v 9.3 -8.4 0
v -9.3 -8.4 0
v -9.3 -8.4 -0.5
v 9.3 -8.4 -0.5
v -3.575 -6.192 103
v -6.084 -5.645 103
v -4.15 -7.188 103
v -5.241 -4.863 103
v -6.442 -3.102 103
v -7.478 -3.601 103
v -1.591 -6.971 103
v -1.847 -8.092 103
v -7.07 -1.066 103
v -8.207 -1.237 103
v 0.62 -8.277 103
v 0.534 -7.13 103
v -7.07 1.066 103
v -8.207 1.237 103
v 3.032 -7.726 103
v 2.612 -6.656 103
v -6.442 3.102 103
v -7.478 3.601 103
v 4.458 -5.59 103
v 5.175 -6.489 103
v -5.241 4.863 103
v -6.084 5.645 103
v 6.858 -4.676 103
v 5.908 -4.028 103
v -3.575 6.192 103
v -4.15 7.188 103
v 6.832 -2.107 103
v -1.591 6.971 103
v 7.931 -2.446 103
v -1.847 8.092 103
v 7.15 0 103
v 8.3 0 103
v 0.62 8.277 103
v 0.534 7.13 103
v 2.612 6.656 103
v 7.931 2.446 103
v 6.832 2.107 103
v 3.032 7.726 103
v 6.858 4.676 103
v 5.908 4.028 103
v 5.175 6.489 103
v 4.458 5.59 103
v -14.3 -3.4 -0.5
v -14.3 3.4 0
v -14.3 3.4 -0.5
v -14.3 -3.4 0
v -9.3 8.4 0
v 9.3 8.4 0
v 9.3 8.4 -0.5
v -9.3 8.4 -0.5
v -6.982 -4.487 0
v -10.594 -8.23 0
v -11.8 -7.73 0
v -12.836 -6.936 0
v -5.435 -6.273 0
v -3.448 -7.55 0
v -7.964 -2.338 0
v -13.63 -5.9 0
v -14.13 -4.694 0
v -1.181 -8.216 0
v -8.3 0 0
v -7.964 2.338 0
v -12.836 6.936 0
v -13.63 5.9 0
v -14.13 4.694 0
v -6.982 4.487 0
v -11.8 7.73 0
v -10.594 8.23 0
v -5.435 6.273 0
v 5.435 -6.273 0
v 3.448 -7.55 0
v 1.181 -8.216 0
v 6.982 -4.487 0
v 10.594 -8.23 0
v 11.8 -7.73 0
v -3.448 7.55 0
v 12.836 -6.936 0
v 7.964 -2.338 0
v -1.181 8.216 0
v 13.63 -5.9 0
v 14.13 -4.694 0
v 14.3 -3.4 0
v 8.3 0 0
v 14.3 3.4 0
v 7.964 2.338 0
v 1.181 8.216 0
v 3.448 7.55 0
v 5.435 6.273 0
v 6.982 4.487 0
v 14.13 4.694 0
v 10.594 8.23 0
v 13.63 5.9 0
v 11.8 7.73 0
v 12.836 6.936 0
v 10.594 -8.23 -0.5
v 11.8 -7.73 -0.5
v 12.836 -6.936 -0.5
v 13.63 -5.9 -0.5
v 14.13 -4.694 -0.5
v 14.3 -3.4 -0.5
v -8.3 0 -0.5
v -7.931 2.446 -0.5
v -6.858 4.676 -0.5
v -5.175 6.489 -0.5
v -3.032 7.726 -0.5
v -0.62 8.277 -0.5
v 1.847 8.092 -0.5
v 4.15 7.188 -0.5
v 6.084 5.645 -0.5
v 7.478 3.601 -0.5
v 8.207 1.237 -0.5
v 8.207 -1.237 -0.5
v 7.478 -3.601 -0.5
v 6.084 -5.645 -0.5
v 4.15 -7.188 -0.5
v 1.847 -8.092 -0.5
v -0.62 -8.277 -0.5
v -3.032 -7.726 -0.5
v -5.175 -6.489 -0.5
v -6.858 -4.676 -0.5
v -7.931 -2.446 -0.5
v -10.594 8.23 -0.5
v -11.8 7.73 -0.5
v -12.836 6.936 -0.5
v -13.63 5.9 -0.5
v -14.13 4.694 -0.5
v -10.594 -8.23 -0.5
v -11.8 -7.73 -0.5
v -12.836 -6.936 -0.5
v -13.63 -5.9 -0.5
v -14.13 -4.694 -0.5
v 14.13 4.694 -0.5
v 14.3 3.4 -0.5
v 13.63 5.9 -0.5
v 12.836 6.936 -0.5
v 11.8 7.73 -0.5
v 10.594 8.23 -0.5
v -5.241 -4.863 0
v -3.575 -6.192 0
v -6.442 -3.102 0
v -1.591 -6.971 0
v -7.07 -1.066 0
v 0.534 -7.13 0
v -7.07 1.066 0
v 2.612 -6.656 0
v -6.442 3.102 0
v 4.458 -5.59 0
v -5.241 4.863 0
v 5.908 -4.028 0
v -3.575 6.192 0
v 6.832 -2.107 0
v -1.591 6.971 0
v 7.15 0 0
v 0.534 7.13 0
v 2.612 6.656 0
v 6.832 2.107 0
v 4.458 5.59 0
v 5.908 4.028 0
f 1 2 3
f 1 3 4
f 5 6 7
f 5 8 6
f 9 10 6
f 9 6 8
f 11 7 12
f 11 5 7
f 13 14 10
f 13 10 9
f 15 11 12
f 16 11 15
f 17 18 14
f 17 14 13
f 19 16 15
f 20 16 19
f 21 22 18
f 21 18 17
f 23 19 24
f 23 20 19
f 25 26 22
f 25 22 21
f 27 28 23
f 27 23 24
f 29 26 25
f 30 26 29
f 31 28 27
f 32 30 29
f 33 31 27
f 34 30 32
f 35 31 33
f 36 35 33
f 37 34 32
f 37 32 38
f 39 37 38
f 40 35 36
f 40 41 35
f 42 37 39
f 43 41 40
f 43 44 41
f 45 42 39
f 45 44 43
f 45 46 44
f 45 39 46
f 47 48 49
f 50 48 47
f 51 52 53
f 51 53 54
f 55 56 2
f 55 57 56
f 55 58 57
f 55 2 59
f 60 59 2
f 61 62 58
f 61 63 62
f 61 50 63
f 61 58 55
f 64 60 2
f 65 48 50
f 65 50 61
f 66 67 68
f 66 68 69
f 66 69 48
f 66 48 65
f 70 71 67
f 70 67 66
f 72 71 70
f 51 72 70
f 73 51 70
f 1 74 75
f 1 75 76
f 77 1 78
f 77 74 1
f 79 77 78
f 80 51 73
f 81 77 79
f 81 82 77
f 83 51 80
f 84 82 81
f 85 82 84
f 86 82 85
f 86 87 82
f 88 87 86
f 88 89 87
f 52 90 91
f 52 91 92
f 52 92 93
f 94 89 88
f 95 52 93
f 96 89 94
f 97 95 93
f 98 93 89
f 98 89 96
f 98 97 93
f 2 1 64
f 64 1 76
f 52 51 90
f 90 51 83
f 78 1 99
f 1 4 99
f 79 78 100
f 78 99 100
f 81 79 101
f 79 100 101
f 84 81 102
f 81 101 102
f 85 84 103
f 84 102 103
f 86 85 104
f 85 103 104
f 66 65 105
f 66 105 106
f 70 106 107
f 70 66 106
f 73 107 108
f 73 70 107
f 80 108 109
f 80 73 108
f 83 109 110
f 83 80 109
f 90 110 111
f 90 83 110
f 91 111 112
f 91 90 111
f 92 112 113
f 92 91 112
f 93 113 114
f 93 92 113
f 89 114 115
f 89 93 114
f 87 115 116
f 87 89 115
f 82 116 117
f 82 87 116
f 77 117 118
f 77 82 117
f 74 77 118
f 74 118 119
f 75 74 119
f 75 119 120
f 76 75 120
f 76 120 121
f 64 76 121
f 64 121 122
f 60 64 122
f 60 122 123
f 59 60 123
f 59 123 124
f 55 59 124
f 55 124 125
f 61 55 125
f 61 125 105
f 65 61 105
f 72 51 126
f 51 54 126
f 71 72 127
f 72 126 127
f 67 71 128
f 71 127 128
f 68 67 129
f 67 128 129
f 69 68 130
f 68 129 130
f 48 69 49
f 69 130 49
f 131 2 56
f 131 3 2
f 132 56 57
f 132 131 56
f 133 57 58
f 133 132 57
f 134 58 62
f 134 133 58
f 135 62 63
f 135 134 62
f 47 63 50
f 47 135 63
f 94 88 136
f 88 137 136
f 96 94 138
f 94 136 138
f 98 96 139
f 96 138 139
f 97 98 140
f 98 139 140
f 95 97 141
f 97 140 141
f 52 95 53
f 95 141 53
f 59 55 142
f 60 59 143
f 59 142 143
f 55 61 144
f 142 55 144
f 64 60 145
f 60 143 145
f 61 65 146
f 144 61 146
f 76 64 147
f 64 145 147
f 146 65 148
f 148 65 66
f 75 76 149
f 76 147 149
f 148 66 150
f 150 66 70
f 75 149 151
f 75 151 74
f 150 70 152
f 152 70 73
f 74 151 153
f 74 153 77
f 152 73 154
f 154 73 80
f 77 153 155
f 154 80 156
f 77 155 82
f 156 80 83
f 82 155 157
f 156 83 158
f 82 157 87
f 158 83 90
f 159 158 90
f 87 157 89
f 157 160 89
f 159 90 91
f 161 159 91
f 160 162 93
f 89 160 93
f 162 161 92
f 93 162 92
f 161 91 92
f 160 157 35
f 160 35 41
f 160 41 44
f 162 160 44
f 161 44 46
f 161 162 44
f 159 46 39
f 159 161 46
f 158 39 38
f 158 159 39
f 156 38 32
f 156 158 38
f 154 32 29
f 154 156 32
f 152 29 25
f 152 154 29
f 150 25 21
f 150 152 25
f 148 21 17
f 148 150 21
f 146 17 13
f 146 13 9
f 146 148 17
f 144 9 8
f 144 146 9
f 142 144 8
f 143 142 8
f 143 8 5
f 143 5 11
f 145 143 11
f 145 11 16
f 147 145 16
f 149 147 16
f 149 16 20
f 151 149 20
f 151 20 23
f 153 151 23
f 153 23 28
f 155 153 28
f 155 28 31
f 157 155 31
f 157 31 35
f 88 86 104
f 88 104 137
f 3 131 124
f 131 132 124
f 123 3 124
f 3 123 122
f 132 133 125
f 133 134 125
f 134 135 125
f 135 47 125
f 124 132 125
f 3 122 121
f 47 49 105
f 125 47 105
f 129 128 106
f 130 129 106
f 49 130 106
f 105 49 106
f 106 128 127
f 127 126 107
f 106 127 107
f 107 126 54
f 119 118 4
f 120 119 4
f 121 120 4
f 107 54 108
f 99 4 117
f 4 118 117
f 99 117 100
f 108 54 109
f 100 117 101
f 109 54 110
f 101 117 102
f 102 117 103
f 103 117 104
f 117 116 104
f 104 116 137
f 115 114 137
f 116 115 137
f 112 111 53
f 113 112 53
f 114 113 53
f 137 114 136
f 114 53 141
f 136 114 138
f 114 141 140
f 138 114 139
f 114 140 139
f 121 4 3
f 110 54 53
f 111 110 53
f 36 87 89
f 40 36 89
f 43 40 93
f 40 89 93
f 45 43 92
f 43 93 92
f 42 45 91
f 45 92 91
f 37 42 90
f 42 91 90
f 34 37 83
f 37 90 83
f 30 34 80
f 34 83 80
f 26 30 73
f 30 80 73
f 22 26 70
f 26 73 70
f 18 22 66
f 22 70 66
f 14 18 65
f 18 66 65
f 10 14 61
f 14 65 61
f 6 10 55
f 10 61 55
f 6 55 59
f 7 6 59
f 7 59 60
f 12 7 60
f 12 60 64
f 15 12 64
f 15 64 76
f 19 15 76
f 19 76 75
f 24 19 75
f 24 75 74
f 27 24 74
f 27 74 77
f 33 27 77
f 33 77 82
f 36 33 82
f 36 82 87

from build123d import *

# Parameters (mm, degrees)
F1_DEPTH = 0.5
F0_R     = 7.15
F2_DEPTH = 100
F3_R     = 5
F4_DEPTH = 103


with BuildPart() as f1:
    # F0 (on Top) → F1 (new body)
    with BuildSketch(Plane.XY):
        with BuildLine():
            Line((14.3, 0), (8.3, 0))
            ThreePointArc((8.3, 0), (0, -8.3), (-8.3, 0))
            Line((-8.3, 0), (-14.3, 0))
            Line((-14.3, 0), (-14.3, -8.4))
            Line((-14.3, -8.4), (14.3, -8.4))
            Line((14.3, -8.4), (14.3, 0))
        make_face()
        with BuildLine():
            ThreePointArc((-8.3, 0), (0, 8.3), (8.3, 0))
            Line((8.3, 0), (14.3, 0))
            Line((14.3, 0), (14.3, 8.4))
            Line((14.3, 8.4), (-14.3, 8.4))
            Line((-14.3, 8.4), (-14.3, 0))
            Line((-14.3, 0), (-8.3, 0))
        make_face()
    extrude(amount=-F1_DEPTH)

    # F3
    f3_edges = [f1.edges().sort_by_distance(p)[0] for p in [
        (14.3, -8.4, -0.25),
        (14.3, 8.4, -0.25),
        (-14.3, 8.4, -0.25),
        (-14.3, -8.4, -0.25),
    ]]
    fillet(f3_edges, radius=F3_R)



with BuildPart() as f2:
    # F0 (on Top) → F2 (new body)
    with BuildSketch(Plane.XY):
        with BuildLine():
            ThreePointArc((-8.3, 0), (0, -8.3), (8.3, 0))
            ThreePointArc((8.3, 0), (0, 8.3), (-8.3, 0))
        make_face()
        Circle(F0_R, mode=Mode.SUBTRACT)
    extrude(amount=F2_DEPTH)


with BuildPart() as f1_1:
    add(f1.part)

    add(f2.part)  # F4 merges F2
    # F0 (on Top) → F4 (join)
    with BuildSketch(Plane.XY):
        with BuildLine():
            ThreePointArc((-8.3, 0), (0, -8.3), (8.3, 0))
            ThreePointArc((8.3, 0), (0, 8.3), (-8.3, 0))
        make_face()
        Circle(F0_R, mode=Mode.SUBTRACT)
    extrude(amount=F4_DEPTH)


solid = f1_1.part
